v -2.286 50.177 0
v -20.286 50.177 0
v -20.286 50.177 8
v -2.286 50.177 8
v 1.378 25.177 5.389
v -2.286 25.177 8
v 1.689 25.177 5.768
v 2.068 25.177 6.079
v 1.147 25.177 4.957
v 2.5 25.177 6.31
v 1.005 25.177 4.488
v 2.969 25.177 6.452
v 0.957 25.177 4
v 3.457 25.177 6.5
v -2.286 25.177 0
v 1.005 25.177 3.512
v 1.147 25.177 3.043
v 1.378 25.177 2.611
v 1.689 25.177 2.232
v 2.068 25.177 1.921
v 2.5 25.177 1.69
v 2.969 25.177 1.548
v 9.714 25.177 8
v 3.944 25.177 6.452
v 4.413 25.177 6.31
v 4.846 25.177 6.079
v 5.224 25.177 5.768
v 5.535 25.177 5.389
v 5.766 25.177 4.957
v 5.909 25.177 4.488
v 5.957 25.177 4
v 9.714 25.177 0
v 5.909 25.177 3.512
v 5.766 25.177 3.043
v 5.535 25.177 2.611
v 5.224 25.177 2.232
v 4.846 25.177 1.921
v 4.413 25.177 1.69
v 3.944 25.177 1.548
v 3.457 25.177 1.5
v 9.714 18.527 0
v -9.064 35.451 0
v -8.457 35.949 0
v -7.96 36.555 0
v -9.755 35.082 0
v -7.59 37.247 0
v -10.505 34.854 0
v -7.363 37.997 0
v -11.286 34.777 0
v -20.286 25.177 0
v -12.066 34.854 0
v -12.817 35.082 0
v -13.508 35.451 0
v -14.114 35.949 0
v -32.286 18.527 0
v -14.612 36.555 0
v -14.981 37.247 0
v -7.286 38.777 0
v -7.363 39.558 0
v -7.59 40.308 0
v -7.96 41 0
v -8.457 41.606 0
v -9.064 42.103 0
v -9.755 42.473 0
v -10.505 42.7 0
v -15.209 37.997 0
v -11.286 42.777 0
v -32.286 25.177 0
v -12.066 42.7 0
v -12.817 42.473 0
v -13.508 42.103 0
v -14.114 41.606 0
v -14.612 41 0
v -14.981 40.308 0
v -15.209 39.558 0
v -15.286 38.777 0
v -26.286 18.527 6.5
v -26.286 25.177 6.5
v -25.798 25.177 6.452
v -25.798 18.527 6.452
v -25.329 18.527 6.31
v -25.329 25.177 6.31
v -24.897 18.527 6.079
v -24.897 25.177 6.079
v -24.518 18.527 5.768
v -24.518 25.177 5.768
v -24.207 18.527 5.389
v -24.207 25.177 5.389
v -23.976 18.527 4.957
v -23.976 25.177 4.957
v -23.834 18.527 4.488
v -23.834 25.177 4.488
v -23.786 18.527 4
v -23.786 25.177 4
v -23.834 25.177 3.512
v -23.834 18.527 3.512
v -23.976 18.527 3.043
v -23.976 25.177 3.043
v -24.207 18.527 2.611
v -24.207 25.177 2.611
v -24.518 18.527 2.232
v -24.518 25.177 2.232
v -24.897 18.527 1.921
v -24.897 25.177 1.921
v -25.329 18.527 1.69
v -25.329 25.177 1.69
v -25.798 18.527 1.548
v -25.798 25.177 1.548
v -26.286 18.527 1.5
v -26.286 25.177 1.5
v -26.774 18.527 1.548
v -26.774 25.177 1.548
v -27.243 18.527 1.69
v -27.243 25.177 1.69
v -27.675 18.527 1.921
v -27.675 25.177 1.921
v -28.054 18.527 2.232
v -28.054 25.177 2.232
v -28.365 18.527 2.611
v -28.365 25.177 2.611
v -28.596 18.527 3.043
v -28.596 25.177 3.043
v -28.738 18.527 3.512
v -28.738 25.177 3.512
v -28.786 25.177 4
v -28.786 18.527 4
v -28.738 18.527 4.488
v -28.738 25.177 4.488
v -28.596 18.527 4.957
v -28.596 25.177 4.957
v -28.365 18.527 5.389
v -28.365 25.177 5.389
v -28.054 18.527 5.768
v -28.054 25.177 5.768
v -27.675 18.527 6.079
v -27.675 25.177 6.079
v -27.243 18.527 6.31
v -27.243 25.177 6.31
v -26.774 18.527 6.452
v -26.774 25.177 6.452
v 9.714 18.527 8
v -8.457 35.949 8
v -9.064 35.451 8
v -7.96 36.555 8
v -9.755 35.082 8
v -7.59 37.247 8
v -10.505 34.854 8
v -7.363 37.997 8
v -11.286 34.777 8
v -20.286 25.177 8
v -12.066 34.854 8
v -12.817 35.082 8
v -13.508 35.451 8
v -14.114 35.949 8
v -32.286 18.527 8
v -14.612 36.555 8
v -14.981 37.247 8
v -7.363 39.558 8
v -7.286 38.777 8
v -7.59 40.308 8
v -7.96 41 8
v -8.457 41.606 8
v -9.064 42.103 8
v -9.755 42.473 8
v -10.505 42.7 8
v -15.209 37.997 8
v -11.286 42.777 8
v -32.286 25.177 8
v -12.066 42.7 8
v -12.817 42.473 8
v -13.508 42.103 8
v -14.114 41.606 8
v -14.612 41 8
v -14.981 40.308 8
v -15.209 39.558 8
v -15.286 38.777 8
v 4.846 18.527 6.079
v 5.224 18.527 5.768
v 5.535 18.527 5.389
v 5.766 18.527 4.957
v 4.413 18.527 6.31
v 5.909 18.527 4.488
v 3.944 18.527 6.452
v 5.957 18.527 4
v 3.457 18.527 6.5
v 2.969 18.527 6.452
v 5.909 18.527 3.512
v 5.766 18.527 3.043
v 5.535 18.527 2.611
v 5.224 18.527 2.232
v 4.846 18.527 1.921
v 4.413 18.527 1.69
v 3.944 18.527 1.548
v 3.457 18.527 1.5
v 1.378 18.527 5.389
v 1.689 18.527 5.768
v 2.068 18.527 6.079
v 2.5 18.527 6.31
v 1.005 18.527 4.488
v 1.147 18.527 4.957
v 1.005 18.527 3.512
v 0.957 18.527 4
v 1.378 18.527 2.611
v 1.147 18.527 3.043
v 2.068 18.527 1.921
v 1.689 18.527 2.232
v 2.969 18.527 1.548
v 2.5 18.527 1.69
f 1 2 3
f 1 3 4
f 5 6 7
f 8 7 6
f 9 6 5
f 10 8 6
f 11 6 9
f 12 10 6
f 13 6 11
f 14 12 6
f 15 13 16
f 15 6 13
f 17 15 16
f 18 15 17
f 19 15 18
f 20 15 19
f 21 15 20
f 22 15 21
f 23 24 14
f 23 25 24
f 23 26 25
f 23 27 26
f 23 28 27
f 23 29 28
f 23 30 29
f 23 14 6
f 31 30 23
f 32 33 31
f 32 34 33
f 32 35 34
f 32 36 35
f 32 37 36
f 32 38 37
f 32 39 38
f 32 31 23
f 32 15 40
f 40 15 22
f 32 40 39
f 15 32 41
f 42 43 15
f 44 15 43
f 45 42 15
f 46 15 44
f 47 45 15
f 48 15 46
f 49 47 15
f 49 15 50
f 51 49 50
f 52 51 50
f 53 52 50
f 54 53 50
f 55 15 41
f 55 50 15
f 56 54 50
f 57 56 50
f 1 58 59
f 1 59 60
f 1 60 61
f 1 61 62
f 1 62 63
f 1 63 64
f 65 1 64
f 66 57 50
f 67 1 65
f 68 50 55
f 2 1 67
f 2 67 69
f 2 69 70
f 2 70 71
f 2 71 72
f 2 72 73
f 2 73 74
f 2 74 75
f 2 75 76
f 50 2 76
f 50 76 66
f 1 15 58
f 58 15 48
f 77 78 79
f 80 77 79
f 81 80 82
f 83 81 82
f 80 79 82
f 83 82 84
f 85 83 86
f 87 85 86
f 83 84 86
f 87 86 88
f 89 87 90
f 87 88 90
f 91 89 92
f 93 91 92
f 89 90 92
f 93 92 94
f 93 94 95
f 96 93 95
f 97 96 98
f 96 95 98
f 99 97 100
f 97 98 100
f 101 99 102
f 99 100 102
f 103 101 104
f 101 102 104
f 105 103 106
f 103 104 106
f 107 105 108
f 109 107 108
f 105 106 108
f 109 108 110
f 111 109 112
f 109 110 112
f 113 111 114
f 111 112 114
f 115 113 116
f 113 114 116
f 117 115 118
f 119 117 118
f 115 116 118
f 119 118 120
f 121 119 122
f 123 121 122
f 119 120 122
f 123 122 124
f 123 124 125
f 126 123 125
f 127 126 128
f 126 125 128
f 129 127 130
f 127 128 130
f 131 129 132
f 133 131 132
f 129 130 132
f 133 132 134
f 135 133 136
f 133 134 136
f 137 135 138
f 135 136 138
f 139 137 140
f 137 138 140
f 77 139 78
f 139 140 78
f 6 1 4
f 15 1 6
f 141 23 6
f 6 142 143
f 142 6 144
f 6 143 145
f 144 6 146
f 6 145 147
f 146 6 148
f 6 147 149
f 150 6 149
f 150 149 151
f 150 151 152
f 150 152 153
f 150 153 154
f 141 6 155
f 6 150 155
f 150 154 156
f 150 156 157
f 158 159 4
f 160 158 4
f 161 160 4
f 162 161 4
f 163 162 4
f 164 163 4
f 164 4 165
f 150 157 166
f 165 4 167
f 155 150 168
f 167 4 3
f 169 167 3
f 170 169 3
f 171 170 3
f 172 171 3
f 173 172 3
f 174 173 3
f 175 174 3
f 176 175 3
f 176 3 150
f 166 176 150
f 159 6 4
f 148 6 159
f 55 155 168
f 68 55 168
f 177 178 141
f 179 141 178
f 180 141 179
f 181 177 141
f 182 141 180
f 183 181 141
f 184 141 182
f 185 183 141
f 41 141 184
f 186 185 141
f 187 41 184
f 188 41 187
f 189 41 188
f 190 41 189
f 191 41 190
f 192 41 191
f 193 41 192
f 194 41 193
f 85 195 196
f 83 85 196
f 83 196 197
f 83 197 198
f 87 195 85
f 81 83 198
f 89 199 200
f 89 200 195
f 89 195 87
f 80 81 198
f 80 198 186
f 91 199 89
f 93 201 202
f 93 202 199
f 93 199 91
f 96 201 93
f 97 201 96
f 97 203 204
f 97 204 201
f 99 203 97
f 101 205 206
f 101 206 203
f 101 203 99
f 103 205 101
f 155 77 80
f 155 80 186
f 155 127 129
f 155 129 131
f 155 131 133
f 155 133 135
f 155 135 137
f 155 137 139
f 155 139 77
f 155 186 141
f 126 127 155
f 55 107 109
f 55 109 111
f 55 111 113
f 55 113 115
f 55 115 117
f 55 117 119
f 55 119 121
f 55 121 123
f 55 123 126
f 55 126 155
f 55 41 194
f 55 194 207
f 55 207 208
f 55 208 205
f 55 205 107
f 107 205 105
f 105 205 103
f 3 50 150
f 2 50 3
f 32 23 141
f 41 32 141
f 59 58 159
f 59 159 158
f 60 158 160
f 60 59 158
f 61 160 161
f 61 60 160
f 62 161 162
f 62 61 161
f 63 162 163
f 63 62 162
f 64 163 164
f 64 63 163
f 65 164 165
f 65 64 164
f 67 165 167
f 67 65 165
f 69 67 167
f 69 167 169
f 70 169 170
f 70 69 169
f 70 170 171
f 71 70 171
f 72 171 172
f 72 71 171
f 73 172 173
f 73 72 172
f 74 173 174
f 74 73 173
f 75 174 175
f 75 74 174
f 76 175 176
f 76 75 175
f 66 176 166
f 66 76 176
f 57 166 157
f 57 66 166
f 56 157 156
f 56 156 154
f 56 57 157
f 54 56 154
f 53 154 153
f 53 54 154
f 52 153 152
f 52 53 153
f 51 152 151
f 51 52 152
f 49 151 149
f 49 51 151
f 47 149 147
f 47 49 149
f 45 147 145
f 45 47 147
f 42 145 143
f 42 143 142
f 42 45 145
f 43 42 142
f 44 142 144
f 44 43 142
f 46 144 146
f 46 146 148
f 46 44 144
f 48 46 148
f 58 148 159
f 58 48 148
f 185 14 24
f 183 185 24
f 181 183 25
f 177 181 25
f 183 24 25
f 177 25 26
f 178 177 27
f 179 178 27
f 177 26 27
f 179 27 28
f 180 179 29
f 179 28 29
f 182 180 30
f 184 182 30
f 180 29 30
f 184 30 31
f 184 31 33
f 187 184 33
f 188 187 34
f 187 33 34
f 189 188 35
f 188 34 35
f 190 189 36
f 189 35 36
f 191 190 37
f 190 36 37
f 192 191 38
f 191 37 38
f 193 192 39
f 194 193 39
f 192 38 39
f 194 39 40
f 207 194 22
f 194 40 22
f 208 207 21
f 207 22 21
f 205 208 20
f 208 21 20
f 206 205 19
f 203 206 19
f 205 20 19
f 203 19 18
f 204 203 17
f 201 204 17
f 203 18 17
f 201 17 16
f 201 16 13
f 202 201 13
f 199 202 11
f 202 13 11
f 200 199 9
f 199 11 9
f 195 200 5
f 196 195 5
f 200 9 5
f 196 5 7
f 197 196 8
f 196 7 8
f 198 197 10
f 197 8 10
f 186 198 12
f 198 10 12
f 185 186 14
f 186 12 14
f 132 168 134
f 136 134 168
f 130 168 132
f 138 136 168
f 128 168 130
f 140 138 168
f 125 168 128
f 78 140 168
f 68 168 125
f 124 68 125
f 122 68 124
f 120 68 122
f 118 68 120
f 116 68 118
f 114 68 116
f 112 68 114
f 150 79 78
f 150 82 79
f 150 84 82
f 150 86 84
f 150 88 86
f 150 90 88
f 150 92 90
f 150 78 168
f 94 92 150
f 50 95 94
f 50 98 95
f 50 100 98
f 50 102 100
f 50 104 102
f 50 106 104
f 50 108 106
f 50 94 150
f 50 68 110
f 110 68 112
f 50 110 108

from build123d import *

# Parameters (mm, degrees)
SKETCH2_R           = 4
BOSS_EXTRUDE1_DEPTH = 8
SKETCH3_R           = 2.5
CUT_EXTRUDE1_DEPTH  = 6.65


with BuildPart() as part:
    # Sketch2 → Boss-Extrude1 (new body)
    with BuildSketch(Plane.XY):
        Polygon((-32.285858586, 18.527272727), (-32.285858586, 25.177272727), (-20.285858586, 25.177272727), (-20.285858586, 50.177272727), (-2.285858586, 50.177272727), (-2.285858586, 25.177272727), (9.714141414, 25.177272727), (9.714141414, 18.527272727), align=None)
        with Locations((-11.285858586, 38.777272727)):
            Circle(SKETCH2_R, mode=Mode.SUBTRACT)
    extrude(amount=BOSS_EXTRUDE1_DEPTH)

    # Sketch3 → Cut-Extrude1 (cut)
    with BuildSketch(Plane(origin=(0, 25.177272727, 0), x_dir=(1, 0, 0), z_dir=(0, 1, 0))):
        with Locations(Location((-26.285858586, -4, 0), (0, 0, 270))):
            Circle(SKETCH3_R)
        with Locations(Location((3.45668569, -4, 0), (0, 0, 270))):
            Circle(SKETCH3_R)
    extrude(amount=-CUT_EXTRUDE1_DEPTH, mode=Mode.SUBTRACT)


solid = part.part
